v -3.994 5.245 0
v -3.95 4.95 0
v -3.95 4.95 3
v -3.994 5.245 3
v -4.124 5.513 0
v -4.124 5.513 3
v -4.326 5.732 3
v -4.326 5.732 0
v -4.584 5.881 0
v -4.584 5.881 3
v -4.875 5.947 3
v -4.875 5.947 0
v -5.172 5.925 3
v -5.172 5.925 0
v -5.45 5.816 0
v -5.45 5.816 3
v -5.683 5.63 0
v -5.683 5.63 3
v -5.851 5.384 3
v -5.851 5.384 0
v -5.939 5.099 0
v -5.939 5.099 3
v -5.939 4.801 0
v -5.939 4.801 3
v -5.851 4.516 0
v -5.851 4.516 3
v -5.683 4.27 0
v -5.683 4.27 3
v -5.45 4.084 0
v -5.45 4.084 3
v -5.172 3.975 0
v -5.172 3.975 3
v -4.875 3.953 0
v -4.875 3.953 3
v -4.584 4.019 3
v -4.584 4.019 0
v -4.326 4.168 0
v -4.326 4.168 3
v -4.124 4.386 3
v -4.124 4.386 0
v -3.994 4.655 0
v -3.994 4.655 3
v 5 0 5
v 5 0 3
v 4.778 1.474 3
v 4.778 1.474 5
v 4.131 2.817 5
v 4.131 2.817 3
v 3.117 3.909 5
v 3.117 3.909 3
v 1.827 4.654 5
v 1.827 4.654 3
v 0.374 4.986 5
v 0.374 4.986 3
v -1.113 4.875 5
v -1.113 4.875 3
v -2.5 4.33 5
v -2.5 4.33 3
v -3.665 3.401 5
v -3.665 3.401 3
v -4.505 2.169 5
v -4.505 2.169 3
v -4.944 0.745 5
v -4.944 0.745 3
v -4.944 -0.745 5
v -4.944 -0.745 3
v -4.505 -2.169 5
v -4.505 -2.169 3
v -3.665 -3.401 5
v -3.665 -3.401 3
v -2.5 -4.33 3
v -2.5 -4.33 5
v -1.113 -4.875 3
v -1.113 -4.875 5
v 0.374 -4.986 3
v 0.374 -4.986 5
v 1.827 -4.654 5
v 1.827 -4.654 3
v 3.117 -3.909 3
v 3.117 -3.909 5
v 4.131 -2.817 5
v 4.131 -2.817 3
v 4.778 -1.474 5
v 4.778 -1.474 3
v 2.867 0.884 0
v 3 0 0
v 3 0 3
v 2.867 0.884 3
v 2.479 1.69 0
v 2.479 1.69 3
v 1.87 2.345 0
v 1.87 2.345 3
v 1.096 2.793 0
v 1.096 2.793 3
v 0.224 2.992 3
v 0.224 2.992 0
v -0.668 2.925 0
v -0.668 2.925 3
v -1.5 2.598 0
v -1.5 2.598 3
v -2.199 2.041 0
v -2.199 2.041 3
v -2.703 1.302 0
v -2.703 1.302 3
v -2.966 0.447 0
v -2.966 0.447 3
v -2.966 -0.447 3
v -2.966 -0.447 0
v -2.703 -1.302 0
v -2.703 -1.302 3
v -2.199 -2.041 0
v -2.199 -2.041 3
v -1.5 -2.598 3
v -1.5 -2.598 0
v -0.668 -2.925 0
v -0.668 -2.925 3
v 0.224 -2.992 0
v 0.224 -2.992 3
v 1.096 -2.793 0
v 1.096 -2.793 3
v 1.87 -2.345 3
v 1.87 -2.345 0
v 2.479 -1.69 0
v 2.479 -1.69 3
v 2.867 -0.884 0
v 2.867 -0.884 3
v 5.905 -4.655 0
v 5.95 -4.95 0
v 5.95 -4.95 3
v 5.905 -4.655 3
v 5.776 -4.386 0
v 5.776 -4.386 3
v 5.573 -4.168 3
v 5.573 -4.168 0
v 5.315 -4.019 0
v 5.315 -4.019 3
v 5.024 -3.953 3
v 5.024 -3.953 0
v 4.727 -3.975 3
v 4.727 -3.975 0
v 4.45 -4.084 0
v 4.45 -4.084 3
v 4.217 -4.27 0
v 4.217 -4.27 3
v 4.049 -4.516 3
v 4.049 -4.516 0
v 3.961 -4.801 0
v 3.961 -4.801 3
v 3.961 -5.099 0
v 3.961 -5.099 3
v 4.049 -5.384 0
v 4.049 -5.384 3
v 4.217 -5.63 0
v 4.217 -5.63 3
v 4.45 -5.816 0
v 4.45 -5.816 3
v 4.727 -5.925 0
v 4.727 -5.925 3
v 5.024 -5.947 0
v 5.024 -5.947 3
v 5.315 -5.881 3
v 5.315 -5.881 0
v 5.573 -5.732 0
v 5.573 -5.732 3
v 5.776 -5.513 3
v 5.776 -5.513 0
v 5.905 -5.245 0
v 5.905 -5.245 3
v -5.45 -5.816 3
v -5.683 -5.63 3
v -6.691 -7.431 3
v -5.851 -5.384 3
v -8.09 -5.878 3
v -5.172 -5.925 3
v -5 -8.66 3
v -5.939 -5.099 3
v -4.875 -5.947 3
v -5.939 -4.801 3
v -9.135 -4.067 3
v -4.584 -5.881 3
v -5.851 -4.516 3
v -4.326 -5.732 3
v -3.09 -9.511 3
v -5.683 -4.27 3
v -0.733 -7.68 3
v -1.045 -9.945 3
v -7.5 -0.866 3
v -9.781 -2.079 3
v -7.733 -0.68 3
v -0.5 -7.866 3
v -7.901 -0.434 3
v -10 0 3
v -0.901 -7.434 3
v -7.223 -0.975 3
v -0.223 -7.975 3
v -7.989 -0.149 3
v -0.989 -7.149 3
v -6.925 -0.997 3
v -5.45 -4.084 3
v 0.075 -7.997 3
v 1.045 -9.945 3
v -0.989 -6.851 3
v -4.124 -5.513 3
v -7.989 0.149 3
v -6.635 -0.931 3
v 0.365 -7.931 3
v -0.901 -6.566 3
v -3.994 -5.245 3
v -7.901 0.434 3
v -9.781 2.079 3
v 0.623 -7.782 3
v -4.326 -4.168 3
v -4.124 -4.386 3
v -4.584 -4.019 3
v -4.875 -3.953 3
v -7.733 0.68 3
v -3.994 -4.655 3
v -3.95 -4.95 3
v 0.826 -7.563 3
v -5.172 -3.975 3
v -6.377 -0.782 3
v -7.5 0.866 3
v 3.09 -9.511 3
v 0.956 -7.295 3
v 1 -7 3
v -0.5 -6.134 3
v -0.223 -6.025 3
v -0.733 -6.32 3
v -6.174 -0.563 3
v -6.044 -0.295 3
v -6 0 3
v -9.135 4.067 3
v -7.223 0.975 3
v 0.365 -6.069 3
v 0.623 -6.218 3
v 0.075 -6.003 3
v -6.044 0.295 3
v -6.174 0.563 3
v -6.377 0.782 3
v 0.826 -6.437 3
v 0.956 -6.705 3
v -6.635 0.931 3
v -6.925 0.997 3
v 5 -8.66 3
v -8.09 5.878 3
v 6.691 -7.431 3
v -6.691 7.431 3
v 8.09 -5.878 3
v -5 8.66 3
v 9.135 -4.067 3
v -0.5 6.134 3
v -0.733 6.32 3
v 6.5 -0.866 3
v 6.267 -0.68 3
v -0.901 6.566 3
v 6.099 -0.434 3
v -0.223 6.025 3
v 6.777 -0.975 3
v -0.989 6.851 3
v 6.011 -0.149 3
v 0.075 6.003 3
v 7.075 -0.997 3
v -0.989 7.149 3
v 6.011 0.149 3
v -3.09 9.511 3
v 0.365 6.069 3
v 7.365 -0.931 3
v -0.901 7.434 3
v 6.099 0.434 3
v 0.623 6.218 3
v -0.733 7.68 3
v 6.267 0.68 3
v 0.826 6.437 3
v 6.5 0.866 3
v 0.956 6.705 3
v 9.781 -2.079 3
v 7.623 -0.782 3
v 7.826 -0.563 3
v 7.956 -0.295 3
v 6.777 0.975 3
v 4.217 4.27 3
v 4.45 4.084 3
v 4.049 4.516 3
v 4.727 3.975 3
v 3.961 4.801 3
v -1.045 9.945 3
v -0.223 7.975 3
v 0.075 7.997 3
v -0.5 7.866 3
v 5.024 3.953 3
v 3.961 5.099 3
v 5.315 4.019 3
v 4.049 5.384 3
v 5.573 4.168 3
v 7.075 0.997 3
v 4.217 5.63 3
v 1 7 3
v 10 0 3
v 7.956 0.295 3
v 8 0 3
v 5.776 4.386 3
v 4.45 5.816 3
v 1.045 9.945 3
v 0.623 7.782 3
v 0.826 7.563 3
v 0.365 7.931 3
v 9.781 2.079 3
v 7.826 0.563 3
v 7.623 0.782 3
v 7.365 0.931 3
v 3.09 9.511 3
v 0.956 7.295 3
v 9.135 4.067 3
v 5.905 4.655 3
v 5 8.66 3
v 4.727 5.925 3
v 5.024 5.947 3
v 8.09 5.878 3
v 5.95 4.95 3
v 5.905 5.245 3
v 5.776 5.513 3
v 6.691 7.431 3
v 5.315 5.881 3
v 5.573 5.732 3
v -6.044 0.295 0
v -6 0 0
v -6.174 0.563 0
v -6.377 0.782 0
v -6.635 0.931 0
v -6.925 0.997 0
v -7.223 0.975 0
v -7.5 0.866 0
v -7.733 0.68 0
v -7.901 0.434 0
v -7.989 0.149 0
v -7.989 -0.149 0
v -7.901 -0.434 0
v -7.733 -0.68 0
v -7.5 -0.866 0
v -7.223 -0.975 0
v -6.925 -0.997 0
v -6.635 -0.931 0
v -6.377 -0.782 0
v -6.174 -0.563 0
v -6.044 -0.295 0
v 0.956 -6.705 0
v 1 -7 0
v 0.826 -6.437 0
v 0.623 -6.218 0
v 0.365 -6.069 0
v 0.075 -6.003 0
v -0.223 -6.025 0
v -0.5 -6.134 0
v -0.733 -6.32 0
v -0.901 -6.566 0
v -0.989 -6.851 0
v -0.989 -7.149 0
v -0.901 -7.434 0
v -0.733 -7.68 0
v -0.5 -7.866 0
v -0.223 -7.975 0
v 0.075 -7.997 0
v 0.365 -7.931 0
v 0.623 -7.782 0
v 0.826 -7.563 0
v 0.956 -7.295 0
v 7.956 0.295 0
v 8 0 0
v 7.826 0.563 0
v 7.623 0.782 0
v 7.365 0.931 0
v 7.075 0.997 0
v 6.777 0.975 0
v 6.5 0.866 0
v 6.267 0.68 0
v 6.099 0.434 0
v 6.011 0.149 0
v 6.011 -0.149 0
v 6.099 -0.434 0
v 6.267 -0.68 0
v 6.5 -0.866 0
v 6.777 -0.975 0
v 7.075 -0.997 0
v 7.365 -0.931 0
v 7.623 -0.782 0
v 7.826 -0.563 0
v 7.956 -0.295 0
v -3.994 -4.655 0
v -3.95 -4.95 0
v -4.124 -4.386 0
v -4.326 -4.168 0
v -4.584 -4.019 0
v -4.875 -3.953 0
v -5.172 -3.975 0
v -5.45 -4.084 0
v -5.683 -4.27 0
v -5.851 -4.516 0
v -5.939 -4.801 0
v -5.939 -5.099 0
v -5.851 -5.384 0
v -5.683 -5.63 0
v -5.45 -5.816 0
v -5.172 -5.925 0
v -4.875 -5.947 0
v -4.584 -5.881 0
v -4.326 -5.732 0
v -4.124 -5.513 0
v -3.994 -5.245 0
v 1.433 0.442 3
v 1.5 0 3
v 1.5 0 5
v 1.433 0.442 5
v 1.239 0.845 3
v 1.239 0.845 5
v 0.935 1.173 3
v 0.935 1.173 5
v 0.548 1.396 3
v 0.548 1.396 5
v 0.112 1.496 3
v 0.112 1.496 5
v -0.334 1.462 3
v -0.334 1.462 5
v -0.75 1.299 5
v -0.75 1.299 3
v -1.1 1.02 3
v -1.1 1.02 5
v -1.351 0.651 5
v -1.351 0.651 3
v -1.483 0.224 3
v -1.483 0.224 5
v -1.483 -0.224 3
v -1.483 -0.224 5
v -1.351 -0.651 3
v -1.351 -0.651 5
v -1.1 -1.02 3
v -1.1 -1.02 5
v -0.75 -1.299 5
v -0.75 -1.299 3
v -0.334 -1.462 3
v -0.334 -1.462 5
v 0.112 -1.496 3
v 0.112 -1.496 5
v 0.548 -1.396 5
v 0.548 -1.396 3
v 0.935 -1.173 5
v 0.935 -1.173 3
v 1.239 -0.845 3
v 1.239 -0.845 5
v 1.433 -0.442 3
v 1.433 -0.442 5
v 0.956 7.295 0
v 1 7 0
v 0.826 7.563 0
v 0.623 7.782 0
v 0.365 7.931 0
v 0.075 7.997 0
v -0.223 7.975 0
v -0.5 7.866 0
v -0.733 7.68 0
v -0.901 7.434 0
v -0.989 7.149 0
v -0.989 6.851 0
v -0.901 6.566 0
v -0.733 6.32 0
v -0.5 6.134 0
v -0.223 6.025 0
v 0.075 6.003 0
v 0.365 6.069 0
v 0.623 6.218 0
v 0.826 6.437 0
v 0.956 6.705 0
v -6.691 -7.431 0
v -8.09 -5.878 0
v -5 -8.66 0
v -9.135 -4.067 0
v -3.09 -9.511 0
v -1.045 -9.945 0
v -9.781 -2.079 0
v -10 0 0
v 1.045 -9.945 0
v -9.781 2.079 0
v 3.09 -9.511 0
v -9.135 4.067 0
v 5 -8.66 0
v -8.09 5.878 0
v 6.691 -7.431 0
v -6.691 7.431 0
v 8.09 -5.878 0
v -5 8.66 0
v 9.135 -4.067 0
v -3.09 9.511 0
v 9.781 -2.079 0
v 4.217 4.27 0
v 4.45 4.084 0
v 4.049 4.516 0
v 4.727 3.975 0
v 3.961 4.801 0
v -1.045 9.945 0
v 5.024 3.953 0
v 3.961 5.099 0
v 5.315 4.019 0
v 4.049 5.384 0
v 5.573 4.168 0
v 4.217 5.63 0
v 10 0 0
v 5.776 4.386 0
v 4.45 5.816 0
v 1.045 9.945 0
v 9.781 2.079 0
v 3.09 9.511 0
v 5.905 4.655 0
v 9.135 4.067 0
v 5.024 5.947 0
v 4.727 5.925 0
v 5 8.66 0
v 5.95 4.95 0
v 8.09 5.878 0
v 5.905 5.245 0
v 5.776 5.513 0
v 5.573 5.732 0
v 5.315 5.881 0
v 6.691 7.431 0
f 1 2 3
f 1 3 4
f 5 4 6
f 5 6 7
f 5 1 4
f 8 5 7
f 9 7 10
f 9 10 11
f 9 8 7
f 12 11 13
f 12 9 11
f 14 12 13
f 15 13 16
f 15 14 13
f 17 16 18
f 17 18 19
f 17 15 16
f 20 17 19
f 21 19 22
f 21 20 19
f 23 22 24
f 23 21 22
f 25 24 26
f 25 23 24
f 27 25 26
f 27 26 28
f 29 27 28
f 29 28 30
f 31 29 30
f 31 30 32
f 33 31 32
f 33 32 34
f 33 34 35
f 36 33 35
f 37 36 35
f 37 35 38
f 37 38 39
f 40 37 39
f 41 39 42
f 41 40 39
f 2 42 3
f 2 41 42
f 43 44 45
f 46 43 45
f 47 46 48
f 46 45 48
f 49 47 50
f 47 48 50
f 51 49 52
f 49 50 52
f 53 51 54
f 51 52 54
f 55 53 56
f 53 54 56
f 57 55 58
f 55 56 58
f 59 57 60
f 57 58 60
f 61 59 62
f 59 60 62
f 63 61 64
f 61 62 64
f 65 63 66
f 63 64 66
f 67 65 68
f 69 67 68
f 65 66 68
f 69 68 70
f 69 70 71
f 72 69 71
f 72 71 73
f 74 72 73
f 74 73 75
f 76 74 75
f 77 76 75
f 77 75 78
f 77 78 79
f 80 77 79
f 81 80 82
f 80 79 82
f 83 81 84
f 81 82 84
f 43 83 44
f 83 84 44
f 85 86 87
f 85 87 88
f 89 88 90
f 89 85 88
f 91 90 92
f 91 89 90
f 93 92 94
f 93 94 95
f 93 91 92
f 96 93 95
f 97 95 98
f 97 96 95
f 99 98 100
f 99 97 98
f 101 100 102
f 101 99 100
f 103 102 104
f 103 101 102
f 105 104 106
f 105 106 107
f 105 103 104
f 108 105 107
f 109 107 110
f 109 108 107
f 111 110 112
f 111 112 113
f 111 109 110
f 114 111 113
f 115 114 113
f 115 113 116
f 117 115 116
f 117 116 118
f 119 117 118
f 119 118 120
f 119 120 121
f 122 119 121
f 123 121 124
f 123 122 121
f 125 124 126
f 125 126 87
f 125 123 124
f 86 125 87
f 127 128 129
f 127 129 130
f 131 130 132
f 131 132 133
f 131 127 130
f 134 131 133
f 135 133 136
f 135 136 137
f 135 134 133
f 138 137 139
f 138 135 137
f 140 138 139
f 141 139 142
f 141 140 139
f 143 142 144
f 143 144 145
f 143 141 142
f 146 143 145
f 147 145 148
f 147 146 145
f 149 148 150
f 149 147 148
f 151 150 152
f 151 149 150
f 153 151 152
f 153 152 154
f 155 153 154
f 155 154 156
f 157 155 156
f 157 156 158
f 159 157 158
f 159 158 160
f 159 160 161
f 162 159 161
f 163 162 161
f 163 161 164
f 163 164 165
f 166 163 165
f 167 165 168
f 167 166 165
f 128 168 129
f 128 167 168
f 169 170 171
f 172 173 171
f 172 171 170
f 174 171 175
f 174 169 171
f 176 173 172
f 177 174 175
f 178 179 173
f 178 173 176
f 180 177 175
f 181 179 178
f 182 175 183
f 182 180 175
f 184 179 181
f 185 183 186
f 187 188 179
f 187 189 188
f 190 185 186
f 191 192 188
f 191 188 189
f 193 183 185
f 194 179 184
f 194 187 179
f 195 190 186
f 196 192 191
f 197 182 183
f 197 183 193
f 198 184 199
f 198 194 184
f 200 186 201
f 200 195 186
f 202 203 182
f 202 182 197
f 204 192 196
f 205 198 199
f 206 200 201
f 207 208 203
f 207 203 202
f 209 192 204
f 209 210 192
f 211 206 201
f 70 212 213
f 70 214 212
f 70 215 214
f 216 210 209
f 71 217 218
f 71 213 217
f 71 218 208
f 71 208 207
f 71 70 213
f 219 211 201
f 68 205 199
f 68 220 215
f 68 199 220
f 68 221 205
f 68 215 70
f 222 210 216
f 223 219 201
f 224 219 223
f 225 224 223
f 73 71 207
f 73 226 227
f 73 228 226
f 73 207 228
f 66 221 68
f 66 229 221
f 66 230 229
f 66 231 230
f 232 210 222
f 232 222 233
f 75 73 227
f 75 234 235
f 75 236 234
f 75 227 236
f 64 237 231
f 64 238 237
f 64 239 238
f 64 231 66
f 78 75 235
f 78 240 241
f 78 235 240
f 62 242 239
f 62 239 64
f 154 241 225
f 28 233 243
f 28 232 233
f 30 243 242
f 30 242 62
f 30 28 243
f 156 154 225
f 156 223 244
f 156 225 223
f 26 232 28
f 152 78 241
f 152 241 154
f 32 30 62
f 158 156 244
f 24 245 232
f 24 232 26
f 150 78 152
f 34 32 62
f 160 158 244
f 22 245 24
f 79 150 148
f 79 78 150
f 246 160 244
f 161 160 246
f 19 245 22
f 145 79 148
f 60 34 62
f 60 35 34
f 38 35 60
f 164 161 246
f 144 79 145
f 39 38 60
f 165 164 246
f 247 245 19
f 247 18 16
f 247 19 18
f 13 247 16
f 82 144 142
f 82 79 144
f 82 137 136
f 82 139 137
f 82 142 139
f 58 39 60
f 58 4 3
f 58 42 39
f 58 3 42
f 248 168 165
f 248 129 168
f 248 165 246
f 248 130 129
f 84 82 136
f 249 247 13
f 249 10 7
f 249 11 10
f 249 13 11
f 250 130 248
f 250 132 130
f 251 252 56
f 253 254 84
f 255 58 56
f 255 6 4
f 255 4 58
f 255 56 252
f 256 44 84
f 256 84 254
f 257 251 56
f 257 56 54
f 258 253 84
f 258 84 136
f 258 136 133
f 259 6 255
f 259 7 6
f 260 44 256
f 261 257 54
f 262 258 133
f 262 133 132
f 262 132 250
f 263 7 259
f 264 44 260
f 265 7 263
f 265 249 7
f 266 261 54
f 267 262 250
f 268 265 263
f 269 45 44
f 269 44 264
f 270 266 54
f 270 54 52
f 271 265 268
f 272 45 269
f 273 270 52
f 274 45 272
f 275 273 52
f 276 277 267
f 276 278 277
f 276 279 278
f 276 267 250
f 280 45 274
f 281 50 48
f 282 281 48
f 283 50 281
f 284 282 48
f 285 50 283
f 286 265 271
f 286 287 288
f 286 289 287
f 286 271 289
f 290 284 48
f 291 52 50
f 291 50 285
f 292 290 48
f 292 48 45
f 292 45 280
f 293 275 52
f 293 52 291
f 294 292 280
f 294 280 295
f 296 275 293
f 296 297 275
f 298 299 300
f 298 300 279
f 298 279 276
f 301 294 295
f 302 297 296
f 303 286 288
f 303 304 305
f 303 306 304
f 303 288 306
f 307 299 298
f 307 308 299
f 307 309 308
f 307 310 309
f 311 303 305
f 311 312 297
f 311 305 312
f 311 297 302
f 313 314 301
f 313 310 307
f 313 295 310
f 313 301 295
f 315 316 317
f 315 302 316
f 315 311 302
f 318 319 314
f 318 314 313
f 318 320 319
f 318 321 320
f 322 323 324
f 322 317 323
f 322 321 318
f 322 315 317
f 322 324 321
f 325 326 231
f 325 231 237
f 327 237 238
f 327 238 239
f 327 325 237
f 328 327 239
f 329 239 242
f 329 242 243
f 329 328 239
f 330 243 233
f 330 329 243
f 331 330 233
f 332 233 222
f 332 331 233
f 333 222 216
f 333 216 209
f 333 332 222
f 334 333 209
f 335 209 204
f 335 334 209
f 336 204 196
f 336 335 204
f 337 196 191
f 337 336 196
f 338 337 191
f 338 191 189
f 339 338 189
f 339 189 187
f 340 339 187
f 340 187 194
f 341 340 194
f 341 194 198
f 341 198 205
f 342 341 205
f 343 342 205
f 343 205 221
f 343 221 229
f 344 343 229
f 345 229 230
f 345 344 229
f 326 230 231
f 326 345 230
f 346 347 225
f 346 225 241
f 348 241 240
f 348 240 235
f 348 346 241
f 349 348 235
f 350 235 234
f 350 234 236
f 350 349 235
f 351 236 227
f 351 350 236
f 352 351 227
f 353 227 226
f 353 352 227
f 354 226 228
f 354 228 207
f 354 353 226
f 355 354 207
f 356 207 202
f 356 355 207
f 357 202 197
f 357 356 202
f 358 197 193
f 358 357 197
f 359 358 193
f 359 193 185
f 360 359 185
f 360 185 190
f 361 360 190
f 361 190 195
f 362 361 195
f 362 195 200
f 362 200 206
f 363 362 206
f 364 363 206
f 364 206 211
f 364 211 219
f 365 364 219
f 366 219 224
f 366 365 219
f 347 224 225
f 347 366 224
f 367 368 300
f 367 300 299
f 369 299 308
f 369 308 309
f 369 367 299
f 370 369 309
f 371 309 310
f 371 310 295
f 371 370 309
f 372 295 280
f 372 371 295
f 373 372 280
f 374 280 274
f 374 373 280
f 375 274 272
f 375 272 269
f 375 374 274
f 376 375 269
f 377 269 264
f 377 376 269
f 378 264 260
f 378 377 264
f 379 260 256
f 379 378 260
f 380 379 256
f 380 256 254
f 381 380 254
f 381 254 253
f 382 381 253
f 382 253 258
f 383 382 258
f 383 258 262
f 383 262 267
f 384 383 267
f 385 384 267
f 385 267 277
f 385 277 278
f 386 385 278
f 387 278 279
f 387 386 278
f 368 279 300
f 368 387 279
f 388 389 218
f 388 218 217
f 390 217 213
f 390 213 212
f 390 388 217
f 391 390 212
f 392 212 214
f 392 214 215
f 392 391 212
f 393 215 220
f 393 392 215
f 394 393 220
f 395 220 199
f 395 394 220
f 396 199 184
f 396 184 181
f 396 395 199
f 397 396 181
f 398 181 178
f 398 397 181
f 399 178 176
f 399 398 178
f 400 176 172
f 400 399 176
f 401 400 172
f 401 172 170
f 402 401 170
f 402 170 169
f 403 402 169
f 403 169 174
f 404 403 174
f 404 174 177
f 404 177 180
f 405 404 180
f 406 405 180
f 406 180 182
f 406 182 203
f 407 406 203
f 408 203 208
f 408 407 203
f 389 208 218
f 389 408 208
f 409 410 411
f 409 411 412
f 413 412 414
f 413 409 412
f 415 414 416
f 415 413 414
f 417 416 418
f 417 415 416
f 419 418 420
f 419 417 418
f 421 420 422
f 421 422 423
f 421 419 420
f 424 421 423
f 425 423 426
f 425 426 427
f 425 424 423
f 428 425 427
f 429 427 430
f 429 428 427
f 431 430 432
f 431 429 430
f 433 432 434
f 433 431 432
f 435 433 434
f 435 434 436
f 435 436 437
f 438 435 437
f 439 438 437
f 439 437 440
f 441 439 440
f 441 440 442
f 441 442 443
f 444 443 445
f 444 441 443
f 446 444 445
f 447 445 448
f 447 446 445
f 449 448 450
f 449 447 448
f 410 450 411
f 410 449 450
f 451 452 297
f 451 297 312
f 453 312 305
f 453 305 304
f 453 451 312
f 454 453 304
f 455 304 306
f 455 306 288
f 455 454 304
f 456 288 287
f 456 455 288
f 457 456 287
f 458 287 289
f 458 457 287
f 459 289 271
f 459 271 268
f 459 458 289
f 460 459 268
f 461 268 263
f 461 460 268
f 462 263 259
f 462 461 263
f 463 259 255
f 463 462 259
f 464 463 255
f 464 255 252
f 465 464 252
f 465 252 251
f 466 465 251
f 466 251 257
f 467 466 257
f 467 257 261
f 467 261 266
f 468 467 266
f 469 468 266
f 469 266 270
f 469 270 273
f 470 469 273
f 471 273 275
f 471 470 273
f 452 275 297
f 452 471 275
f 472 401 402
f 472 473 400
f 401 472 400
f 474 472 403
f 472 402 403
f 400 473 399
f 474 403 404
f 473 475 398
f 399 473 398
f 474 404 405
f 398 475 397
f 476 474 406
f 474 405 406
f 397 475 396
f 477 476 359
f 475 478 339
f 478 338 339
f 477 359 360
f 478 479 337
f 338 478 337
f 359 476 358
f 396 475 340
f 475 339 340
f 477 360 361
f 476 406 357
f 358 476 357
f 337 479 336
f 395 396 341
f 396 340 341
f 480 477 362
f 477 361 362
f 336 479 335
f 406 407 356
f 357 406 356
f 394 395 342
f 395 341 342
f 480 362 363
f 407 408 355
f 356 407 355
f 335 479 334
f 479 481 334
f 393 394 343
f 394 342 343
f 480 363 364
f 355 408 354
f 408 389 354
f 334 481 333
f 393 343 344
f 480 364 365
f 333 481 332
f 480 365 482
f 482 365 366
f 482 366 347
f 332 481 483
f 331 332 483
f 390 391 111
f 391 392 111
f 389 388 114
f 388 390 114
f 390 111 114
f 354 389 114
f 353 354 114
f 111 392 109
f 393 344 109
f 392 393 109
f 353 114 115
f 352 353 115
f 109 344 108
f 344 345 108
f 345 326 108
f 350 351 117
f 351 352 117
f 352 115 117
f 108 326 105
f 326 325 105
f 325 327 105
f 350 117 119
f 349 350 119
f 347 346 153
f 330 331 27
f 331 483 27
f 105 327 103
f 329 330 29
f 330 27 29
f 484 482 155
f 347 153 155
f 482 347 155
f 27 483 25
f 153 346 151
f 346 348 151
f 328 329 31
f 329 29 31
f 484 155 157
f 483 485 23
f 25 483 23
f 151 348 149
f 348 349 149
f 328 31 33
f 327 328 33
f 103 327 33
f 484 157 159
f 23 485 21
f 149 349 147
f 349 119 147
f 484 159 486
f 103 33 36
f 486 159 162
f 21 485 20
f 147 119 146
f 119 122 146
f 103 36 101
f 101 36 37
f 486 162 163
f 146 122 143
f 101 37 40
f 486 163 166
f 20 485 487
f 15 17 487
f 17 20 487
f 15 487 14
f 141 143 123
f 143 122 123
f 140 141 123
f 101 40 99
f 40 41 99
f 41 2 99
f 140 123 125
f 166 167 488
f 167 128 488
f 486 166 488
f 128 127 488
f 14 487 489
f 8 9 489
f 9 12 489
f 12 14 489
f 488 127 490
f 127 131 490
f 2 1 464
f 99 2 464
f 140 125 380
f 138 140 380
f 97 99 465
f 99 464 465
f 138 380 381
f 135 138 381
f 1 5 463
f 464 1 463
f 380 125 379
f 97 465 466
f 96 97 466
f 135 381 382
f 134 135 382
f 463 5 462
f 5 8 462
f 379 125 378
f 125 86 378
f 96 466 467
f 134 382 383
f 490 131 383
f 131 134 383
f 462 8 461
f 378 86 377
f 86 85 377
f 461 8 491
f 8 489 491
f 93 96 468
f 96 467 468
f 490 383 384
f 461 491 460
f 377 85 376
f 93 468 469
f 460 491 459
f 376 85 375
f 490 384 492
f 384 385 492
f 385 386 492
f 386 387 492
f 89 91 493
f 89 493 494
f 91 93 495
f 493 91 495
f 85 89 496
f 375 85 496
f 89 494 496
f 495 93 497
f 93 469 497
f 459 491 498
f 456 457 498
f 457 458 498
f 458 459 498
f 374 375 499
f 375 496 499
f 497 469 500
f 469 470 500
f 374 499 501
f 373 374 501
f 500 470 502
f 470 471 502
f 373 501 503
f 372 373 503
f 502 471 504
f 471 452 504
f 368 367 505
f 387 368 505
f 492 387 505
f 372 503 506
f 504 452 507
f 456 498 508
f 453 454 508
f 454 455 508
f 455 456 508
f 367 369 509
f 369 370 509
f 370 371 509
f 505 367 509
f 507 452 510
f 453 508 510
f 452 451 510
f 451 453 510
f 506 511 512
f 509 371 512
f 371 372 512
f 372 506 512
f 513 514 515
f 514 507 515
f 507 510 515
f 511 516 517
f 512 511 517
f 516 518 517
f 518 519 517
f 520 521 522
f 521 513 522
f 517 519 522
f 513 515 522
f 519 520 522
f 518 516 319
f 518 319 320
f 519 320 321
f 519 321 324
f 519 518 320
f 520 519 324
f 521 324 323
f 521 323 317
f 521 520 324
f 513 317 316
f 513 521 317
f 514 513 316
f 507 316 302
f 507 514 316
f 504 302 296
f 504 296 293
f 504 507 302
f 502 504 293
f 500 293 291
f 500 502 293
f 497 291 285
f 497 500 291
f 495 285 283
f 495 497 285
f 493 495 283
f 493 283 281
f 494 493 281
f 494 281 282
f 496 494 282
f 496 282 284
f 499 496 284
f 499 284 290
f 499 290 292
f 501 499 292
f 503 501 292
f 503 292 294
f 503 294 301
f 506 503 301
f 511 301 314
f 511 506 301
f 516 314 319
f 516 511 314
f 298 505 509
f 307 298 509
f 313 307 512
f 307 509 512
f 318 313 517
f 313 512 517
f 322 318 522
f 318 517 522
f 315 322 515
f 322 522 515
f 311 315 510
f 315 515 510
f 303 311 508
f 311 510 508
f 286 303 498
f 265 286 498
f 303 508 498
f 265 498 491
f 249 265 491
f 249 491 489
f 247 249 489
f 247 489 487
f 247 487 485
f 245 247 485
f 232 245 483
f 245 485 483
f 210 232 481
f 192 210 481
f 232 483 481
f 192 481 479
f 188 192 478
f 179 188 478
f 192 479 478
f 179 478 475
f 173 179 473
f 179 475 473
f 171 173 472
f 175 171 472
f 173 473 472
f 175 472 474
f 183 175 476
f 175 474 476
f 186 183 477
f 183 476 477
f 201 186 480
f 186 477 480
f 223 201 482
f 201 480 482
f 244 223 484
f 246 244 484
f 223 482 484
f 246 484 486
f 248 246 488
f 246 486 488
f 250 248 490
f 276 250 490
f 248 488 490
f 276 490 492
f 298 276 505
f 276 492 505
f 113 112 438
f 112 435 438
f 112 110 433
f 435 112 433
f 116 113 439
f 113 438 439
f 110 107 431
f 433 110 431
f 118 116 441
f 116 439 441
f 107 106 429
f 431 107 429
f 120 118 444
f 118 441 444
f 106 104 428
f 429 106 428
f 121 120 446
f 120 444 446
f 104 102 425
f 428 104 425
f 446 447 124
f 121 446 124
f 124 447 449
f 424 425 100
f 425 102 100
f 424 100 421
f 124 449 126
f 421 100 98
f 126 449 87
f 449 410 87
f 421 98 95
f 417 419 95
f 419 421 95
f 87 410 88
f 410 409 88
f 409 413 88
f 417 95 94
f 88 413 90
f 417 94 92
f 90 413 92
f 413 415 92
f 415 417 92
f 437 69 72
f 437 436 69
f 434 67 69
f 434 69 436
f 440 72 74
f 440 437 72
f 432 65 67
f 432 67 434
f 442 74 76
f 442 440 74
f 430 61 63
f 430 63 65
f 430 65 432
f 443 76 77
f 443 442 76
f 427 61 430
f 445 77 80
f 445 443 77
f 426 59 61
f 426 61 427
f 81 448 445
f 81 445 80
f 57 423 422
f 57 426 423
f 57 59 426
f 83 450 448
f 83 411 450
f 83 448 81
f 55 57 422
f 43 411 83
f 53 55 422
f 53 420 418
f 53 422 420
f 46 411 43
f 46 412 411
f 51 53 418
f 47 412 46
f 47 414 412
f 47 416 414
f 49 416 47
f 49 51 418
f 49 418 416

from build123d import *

# Parameters (mm, degrees)
SKETCH_1_R      = 10
SKETCH_1_R_2    = 3
SKETCH_1_R_3    = 1
EXTRUDE_1_DEPTH = 3
SKETCH_2_R      = 5
SKETCH_2_R_2    = 1.5
EXTRUDE_2_DEPTH = 2


with BuildPart() as part:
    # 草图1 → 凸台-拉伸1 (new body)
    with BuildSketch(Plane.XY):
        Circle(SKETCH_1_R)
        Circle(SKETCH_1_R_2, mode=Mode.SUBTRACT)
        with Locations((7, 0)):
            Circle(SKETCH_1_R_3, mode=Mode.SUBTRACT)
        with Locations((4.949747468, -4.949747468)):
            Circle(SKETCH_1_R_3, mode=Mode.SUBTRACT)
        with Locations((0, -7)):
            Circle(SKETCH_1_R_3, mode=Mode.SUBTRACT)
        with Locations((-4.949747468, -4.949747468)):
            Circle(SKETCH_1_R_3, mode=Mode.SUBTRACT)
        with Locations((-7, 0)):
            Circle(SKETCH_1_R_3, mode=Mode.SUBTRACT)
        with Locations((-4.949747468, 4.949747468)):
            Circle(SKETCH_1_R_3, mode=Mode.SUBTRACT)
        with Locations((0, 7)):
            Circle(SKETCH_1_R_3, mode=Mode.SUBTRACT)
        with Locations((4.949747468, 4.949747468)):
            Circle(SKETCH_1_R_3, mode=Mode.SUBTRACT)
    extrude(amount=EXTRUDE_1_DEPTH)

    # 草图2 → 凸台-拉伸2 (add)
    with BuildSketch(Plane.XY.offset(3)):
        Circle(SKETCH_2_R)
        Circle(SKETCH_2_R_2, mode=Mode.SUBTRACT)
    extrude(amount=EXTRUDE_2_DEPTH)


solid = part.part
